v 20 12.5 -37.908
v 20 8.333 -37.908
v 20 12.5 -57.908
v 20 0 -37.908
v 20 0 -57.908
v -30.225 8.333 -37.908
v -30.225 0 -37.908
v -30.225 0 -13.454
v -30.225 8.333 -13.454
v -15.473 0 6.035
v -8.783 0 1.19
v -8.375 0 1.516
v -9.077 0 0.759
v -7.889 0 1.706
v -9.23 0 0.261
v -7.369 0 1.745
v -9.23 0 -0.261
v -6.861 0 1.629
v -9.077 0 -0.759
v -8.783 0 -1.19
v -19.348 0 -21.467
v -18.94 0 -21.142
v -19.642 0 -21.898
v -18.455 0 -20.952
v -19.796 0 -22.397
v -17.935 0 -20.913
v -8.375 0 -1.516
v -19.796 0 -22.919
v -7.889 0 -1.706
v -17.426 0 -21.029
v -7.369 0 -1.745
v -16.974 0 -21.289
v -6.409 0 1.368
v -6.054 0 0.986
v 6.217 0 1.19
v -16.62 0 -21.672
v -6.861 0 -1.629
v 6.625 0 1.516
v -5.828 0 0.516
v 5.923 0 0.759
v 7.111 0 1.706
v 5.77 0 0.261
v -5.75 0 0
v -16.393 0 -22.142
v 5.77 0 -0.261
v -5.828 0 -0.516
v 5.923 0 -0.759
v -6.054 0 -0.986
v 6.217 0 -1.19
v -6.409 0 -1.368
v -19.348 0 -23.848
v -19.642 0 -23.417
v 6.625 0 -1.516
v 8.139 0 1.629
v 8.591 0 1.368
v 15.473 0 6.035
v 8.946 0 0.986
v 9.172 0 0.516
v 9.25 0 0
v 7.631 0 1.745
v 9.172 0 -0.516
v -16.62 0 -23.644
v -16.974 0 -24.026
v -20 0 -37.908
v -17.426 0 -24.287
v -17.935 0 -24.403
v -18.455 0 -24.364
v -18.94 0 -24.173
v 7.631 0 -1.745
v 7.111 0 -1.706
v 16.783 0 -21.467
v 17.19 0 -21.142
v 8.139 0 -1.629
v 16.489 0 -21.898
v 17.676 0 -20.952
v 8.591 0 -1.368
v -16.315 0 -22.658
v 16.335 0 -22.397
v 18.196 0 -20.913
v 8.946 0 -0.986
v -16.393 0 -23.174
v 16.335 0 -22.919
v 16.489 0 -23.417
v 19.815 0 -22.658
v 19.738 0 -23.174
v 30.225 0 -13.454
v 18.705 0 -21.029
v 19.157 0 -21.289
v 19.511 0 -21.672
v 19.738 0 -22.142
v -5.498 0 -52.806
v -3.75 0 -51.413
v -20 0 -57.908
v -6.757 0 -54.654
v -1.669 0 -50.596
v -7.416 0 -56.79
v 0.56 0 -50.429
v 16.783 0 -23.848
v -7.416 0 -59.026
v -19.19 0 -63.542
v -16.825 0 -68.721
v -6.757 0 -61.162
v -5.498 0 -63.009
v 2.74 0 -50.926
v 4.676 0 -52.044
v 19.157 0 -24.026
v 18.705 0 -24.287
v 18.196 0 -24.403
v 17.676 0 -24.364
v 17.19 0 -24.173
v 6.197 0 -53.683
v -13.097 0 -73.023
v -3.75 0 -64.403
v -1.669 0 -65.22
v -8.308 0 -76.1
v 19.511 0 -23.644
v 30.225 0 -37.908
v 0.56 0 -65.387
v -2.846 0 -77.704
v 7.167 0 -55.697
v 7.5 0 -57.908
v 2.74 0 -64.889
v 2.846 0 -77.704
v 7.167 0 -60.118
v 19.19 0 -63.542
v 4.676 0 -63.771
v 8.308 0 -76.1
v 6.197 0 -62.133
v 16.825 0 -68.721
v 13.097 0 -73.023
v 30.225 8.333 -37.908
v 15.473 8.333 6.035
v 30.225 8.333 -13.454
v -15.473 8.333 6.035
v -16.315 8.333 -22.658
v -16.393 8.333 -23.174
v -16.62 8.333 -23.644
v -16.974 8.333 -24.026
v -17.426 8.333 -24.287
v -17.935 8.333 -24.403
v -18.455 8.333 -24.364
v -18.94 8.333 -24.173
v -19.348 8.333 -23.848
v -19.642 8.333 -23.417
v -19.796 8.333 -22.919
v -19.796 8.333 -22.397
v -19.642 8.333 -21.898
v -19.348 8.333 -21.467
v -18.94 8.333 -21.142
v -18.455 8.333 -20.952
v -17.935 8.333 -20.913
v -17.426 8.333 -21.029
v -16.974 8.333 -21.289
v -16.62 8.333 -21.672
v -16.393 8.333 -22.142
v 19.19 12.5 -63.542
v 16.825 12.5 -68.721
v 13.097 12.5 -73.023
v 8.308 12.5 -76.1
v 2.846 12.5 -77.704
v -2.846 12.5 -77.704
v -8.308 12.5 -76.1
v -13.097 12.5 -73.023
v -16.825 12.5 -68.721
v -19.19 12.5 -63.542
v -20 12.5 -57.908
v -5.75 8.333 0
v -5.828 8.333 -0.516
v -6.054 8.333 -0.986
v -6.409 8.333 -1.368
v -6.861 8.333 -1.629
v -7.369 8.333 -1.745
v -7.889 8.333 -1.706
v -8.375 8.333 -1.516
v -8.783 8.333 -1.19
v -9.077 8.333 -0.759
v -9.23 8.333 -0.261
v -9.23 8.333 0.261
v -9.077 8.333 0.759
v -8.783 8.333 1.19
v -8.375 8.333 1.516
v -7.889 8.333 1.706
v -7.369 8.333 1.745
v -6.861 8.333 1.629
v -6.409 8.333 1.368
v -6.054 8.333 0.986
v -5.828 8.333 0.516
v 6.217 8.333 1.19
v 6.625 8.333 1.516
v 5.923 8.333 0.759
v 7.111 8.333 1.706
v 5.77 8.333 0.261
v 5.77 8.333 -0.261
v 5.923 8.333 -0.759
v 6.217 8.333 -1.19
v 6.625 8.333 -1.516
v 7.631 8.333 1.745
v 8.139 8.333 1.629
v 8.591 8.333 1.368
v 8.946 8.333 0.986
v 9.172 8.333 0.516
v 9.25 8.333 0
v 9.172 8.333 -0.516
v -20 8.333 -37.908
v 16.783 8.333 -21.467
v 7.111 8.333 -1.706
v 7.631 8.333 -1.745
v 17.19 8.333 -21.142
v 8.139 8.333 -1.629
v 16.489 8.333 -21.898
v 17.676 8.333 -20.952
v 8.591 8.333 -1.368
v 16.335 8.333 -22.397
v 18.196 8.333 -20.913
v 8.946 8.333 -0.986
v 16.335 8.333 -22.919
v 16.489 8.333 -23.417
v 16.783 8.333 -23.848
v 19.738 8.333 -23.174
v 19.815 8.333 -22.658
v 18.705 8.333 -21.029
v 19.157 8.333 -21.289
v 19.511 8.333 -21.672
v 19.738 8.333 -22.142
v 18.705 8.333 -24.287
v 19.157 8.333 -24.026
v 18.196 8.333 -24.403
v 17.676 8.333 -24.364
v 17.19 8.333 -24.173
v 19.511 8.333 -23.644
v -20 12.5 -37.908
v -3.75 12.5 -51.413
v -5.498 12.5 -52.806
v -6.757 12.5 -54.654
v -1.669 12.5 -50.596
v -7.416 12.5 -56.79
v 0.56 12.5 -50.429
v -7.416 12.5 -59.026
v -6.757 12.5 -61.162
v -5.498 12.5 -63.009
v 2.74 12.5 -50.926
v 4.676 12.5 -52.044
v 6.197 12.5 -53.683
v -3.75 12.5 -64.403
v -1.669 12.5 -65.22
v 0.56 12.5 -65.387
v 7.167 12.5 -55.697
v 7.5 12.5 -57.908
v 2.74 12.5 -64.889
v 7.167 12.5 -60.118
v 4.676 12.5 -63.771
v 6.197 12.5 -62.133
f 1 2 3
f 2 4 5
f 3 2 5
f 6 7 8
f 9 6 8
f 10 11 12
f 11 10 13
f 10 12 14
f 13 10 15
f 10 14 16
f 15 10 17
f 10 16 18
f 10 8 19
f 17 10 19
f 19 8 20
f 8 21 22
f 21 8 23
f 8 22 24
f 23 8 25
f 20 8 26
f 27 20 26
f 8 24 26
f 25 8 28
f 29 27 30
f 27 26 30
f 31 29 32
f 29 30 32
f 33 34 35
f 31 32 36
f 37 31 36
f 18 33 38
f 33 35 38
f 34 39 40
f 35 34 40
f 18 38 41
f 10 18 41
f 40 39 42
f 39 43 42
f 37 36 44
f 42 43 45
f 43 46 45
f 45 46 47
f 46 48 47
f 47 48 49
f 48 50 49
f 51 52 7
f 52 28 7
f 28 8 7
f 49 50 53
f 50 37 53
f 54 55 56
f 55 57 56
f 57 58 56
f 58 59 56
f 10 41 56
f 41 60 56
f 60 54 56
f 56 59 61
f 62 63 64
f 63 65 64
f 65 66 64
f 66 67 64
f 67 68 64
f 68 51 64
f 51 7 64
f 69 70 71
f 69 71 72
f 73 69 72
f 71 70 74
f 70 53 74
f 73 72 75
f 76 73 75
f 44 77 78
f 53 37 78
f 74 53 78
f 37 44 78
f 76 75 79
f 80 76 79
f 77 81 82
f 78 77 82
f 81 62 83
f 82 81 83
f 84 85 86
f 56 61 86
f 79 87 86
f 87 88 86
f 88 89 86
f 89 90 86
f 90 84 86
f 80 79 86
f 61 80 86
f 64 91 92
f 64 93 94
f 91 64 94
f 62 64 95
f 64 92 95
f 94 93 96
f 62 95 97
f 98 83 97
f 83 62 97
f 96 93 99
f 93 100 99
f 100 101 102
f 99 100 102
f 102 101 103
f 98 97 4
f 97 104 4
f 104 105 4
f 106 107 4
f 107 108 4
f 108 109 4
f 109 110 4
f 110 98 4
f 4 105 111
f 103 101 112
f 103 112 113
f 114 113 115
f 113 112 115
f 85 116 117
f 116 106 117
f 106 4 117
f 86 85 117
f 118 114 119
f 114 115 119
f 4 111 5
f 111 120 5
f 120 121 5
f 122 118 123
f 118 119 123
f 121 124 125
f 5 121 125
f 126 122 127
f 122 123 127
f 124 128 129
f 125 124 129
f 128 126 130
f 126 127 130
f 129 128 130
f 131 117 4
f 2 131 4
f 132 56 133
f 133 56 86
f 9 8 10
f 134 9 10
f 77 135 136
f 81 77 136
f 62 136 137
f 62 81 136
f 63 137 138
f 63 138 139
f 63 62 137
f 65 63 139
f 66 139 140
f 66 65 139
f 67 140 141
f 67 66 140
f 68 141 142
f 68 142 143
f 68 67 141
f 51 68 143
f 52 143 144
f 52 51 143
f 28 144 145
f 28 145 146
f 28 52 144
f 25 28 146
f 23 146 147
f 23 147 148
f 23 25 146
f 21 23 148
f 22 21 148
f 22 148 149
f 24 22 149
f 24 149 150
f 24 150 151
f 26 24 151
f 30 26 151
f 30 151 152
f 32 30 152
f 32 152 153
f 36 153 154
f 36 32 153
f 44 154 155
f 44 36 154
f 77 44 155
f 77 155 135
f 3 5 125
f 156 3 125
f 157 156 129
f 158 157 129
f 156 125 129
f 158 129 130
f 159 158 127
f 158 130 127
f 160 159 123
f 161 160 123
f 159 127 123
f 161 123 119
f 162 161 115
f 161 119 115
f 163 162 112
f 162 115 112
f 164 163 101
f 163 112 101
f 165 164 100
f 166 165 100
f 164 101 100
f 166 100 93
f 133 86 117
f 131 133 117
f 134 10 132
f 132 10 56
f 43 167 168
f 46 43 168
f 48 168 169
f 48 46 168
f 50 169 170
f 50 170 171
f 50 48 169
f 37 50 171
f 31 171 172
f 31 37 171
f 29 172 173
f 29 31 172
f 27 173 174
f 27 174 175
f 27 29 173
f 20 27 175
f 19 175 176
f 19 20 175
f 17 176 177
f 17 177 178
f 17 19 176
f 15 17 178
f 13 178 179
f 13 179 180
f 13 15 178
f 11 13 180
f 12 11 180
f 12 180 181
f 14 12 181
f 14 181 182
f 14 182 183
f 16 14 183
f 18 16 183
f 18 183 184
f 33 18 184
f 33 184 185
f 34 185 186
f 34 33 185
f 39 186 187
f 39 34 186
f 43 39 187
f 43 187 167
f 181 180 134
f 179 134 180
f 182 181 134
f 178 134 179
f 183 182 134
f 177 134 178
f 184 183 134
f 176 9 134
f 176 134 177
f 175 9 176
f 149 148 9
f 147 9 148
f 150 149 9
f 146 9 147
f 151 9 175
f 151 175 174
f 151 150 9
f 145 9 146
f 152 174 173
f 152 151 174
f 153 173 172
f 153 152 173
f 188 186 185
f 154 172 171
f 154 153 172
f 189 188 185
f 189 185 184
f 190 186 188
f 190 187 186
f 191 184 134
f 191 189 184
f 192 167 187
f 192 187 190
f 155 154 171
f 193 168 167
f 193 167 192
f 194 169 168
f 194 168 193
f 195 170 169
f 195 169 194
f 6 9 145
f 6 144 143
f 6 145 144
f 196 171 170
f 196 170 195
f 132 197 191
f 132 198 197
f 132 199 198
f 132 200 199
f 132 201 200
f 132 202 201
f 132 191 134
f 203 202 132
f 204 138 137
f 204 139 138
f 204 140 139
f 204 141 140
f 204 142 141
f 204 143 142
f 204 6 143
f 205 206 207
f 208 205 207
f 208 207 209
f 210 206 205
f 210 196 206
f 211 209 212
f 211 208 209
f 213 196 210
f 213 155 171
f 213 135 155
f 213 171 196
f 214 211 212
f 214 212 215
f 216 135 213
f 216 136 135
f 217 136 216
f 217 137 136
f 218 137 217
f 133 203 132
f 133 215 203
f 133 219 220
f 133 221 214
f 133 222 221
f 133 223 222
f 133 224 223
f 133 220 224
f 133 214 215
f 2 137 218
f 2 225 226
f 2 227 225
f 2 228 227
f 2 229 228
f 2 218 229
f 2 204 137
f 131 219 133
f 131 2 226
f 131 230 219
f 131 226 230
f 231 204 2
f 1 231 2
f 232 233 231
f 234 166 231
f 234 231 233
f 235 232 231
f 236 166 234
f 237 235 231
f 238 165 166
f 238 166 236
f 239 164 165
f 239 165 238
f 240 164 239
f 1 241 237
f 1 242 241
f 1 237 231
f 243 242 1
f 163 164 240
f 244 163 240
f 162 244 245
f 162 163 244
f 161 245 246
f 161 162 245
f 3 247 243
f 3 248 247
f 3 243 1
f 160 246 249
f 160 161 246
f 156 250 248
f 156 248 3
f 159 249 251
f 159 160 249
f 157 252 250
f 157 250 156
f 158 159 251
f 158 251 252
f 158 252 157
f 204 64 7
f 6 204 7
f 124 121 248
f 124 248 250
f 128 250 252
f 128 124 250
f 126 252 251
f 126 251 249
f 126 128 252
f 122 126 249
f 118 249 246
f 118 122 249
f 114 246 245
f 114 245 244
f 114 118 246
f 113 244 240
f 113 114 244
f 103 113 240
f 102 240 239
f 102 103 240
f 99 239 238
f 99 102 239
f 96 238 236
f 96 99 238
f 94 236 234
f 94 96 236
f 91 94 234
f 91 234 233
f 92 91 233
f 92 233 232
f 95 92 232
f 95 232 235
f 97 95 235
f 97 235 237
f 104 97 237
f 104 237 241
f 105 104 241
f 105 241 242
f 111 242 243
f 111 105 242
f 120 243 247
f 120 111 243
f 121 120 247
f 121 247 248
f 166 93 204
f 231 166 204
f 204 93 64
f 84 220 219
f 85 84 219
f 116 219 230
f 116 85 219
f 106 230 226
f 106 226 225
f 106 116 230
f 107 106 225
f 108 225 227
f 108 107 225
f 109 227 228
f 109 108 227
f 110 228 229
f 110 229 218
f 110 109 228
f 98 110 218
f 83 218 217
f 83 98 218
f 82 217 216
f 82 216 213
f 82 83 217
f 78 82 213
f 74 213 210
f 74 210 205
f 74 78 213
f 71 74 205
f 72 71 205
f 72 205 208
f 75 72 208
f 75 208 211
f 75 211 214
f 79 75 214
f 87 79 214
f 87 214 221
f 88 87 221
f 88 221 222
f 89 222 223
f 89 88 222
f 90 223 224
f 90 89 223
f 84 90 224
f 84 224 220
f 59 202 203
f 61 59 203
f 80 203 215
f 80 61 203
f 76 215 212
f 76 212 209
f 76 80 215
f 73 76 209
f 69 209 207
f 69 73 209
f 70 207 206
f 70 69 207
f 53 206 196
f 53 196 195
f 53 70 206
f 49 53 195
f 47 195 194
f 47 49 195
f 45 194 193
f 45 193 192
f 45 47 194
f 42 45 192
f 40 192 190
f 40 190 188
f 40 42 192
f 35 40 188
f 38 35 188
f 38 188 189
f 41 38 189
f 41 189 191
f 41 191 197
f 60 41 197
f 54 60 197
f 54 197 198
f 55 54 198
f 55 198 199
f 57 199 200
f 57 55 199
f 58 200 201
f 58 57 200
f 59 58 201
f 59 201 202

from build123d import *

# Parameters (mm, degrees)
SKETCH1_R           = 1.75
BOSS_EXTRUDE1_DEPTH = 8.333333333
SKETCH2_R           = 7.5
BOSS_EXTRUDE2_DEPTH = 12.5


with BuildPart() as part:
    # Sketch1 → Boss-Extrude1 (new body)
    with BuildSketch(Plane(origin=(0, 0, 0), x_dir=(1, 0, 0), z_dir=(0, 1, 0))):
        Polygon((-30.225021847, 13.45402847), (-15.473485445, -6.035190955), (15.473485445, -6.035190955), (30.225021847, 13.45402847), (30.225021847, 37.907694676), (18.065456544, 37.907694676), (-18.065456544, 37.907694676), (-30.225021847, 37.907694676), align=None)
        with Locations((-18.065456544, 22.657694676)):
            Circle(SKETCH1_R, mode=Mode.SUBTRACT)
        with Locations((18.065456544, 22.657694676)):
            Circle(SKETCH1_R, mode=Mode.SUBTRACT)
        with Locations((7.5, 0)):
            Circle(SKETCH1_R, mode=Mode.SUBTRACT)
        with Locations((-7.5, 0)):
            Circle(SKETCH1_R, mode=Mode.SUBTRACT)
    extrude(amount=BOSS_EXTRUDE1_DEPTH)

    # Sketch2 → Boss-Extrude2 (add)
    with BuildSketch(Plane(origin=(0, 0, 0), x_dir=(1, 0, 0), z_dir=(0, 1, 0))):
        with BuildLine():
            Line((-20, 57.907694676), (-20, 37.907694676))
            Line((-20, 37.907694676), (20, 37.907694676))
            Line((20, 37.907694676), (20, 57.907694676))
            ThreePointArc((20, 57.907694676), (0, 77.907694676), (-20, 57.907694676))
        make_face()
        with Locations((0, 57.907694676)):
            Circle(SKETCH2_R, mode=Mode.SUBTRACT)
    extrude(amount=BOSS_EXTRUDE2_DEPTH)


solid = part.part
